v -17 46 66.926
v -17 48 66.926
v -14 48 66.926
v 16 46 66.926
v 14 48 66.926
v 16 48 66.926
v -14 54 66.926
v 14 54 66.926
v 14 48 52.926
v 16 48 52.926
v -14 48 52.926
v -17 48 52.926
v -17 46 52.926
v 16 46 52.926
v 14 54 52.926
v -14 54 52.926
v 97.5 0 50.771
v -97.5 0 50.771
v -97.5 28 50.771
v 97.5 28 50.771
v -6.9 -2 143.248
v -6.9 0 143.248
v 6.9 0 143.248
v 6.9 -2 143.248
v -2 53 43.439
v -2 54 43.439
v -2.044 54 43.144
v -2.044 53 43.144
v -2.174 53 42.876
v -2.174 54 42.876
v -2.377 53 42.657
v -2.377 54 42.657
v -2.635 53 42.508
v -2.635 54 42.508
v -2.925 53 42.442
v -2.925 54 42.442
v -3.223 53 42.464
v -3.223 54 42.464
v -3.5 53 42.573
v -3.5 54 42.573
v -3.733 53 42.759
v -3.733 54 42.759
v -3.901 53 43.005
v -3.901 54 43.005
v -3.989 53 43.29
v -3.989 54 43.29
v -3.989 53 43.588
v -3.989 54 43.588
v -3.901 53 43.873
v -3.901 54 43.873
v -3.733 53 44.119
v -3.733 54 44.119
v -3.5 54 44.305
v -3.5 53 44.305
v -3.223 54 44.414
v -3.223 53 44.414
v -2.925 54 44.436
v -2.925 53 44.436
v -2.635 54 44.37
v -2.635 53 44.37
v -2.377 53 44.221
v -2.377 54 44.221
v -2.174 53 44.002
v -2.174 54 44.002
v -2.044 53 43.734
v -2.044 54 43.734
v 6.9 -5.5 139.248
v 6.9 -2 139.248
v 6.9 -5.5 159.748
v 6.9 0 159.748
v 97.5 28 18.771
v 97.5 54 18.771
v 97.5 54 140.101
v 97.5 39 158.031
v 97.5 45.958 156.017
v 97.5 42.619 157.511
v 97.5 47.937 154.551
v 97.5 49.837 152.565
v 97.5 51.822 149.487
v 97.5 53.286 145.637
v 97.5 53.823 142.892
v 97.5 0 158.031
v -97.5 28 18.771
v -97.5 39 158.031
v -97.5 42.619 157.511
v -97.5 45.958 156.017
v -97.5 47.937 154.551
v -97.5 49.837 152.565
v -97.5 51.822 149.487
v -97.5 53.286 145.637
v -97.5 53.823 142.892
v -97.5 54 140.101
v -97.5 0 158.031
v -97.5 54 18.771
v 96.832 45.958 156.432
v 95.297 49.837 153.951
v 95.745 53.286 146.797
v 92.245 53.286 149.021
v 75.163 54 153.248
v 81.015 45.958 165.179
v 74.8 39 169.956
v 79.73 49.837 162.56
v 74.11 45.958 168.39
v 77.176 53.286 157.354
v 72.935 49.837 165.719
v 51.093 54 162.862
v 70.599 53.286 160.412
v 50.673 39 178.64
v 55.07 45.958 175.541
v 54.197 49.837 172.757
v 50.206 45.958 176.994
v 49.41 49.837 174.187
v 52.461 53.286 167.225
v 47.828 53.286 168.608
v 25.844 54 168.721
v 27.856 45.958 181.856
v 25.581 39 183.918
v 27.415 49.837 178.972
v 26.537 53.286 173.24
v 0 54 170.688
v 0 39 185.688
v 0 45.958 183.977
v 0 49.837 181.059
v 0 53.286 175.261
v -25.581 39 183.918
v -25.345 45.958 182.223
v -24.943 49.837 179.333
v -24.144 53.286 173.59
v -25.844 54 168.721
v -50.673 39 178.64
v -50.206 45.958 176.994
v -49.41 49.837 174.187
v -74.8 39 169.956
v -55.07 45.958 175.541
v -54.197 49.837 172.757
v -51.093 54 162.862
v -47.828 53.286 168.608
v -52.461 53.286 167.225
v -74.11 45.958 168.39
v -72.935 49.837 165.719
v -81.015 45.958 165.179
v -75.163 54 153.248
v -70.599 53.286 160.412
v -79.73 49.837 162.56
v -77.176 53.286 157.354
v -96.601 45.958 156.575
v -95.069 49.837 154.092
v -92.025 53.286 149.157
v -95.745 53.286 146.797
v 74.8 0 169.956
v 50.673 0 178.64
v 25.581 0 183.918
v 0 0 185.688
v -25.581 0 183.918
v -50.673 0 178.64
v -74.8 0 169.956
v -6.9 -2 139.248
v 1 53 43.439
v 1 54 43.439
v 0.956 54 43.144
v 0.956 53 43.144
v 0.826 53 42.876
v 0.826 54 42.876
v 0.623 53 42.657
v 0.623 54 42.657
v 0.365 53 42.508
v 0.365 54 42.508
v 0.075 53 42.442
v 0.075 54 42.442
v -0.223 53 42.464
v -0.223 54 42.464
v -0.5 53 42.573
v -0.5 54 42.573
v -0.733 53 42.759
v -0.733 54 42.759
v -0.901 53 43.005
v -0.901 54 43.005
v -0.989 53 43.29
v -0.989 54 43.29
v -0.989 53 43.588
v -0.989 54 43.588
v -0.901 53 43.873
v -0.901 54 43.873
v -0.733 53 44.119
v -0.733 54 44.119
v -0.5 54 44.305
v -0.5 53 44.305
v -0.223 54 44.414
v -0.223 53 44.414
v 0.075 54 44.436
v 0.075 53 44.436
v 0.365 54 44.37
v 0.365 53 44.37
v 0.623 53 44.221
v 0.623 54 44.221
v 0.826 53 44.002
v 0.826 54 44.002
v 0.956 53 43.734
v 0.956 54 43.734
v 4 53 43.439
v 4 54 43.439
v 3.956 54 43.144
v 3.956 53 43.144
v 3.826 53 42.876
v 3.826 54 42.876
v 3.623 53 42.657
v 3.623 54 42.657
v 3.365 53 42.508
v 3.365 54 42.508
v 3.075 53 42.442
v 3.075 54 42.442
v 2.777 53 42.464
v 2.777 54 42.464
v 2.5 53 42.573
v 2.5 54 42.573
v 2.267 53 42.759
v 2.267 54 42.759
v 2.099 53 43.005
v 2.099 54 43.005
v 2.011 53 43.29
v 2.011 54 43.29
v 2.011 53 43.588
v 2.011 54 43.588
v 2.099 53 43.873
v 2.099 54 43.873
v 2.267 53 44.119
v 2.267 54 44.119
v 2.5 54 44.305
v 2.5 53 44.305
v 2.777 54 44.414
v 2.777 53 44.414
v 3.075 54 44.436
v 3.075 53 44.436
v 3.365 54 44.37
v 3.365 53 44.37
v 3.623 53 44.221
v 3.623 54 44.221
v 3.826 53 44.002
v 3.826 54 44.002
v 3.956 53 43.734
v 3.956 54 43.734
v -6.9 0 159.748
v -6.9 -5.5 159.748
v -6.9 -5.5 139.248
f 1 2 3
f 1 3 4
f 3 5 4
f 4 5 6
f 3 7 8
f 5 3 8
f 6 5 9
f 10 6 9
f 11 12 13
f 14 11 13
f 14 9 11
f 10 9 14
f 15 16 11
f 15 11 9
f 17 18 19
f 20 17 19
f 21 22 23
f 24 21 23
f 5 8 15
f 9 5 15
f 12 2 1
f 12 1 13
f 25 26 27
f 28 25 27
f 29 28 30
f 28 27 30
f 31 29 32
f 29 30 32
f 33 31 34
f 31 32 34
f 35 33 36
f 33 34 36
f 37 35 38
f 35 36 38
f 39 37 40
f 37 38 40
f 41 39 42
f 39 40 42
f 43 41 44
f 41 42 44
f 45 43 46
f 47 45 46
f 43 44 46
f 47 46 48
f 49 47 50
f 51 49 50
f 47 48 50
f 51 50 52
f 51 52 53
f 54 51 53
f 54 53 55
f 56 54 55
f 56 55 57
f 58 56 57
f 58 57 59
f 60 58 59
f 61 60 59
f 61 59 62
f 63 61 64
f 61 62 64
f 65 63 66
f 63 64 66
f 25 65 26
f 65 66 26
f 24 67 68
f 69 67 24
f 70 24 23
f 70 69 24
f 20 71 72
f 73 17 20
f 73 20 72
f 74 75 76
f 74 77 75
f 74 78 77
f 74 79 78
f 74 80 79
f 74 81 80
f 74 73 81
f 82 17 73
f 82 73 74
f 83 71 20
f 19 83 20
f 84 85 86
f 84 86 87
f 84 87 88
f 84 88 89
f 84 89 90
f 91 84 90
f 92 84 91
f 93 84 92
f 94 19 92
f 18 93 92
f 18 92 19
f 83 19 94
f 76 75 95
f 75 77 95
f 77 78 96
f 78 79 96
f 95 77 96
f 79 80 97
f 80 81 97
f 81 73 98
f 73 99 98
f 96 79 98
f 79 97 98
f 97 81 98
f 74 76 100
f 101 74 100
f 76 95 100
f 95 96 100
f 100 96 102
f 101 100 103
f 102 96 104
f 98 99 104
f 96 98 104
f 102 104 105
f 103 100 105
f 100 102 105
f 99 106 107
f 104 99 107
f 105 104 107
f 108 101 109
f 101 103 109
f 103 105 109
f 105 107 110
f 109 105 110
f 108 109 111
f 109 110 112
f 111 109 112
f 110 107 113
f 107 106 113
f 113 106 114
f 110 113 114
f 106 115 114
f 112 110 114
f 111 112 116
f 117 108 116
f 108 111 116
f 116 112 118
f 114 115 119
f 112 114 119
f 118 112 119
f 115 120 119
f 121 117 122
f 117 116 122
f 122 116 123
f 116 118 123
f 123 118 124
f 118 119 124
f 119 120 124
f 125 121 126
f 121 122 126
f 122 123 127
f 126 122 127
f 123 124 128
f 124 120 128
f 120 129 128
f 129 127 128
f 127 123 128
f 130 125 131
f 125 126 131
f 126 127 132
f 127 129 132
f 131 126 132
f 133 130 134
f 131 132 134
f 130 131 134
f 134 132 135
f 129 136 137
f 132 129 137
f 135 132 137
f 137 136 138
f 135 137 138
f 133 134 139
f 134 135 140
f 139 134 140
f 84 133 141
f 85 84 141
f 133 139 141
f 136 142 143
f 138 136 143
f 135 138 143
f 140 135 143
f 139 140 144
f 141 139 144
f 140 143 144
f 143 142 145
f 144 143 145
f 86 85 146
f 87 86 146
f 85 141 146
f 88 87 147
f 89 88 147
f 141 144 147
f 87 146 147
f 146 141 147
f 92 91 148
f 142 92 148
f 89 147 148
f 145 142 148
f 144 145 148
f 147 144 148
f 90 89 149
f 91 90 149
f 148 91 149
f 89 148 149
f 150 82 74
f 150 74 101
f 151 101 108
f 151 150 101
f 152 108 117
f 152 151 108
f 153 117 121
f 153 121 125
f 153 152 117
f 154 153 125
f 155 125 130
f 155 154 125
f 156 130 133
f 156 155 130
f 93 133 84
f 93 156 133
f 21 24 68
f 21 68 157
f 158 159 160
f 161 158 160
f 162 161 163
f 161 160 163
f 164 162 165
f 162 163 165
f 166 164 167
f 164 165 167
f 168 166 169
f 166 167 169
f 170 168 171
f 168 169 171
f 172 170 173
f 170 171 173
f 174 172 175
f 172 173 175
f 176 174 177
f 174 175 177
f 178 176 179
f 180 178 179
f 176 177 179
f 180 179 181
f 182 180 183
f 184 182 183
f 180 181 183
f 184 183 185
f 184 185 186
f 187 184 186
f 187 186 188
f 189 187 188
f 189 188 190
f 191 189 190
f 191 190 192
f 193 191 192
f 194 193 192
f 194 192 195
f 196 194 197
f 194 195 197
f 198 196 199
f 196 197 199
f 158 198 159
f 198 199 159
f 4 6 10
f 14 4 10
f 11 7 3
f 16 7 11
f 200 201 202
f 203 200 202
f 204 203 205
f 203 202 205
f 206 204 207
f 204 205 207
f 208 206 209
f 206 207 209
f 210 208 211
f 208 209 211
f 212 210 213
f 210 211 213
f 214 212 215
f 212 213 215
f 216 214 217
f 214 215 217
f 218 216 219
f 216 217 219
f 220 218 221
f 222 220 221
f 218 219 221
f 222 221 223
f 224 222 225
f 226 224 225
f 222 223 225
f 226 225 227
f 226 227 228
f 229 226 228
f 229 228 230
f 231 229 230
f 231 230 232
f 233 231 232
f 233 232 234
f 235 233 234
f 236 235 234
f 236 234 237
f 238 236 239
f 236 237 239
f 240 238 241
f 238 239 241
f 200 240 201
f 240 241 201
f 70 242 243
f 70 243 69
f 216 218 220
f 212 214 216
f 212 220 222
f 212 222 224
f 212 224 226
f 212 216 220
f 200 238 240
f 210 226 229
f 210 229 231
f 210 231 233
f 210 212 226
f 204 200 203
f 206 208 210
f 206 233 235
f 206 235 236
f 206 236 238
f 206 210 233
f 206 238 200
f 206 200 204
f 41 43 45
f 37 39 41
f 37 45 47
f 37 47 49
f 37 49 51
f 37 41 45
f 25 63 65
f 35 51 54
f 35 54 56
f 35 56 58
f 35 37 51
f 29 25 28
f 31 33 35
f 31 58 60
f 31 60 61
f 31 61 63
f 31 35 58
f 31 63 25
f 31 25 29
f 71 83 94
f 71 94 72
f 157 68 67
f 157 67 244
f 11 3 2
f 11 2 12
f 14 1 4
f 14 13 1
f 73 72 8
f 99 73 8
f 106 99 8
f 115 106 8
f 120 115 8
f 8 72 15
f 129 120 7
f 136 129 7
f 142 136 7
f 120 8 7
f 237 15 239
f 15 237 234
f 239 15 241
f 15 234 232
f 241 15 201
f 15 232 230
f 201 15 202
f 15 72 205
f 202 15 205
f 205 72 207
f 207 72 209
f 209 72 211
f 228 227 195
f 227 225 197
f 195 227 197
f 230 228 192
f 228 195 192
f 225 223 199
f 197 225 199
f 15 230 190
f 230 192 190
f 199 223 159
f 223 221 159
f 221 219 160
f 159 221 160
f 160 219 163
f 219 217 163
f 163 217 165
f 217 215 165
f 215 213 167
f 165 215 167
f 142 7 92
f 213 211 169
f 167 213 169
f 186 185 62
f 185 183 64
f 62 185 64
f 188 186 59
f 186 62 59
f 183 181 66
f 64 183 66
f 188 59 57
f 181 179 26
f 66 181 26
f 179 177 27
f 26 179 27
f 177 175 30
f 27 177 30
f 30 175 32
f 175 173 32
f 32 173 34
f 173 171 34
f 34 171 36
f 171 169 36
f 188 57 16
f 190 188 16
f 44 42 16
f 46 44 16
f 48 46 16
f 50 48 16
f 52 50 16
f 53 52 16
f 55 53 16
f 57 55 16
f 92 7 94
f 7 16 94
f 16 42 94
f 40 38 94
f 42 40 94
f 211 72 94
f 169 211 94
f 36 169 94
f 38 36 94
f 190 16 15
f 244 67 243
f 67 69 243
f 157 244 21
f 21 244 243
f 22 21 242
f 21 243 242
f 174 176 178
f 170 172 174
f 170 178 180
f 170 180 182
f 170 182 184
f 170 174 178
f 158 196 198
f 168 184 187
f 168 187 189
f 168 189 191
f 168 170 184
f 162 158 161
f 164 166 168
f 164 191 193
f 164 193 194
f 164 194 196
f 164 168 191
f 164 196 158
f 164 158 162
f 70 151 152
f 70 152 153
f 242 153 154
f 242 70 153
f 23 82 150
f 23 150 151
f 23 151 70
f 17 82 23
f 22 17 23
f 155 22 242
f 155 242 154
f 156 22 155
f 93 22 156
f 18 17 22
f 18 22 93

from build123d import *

# Parameters (mm, degrees)
BOSS_EXTRUDE1_DEPTH     = 54
FILLET1_R               = 15
SKETCH2_W               = 32
SKETCH2_H               = 28
CUT_EXTRUDE1_DEPTH      = 445
SKETCH3_W               = 13.8
SKETCH3_H               = 16.5
BOSS_EXTRUDE2_DEPTH     = 5.5
SKETCH4_W               = 13.8
SKETCH4_H               = 3.5
BOSS_EXTRUDE3_DEPTH     = 4
SKETCH5_R               = 1
CUT_EXTRUDE2_DEPTH      = 1
SKETCH6_W               = 28
SKETCH6_H               = 14
CUT_EXTRUDE3_DEPTH      = 8
SKETCH7_W               = 14
SKETCH7_H               = 2
CUT_EXTRUDE4_DEPTH      = 30
CUT_EXTRUDE4_DEPTH_BACK = 3


with BuildPart() as part:
    # Sketch1 → Boss-Extrude1 (new body)
    with BuildSketch(Plane(origin=(0, 0, 0), x_dir=(1, 0, 0), z_dir=(0, 1, 0))):
        with BuildLine():
            Line((-97.5, -18.771444772), (97.5, -18.771444772))
            Line((97.5, -18.771444772), (97.5, -158.031444772))
            ThreePointArc((97.5, -158.031444772), (0, -185.688415193), (-97.5, -158.031444772))
            Line((-97.5, -158.031444772), (-97.5, -18.771444772))
        make_face()
    extrude(amount=BOSS_EXTRUDE1_DEPTH)

    # Fillet1
    fillet1_edges = [part.edges().sort_by_distance(p)[0] for p in [
        (0, 54, 185.688415193),
    ]]
    fillet(fillet1_edges, radius=FILLET1_R)

    # Sketch2 → Cut-Extrude1 (cut)
    with BuildSketch(Plane.ZY.offset(97.5)):
        with Locations((34.771444772, 14)):
            Rectangle(SKETCH2_W, SKETCH2_H)
    extrude(amount=-CUT_EXTRUDE1_DEPTH, mode=Mode.SUBTRACT)

    # Sketch3 → Boss-Extrude2 (add)
    with BuildSketch(Plane.XZ):
        with Locations((0, 151.498415193)):
            Rectangle(SKETCH3_W, SKETCH3_H)
    extrude(amount=BOSS_EXTRUDE2_DEPTH)

    # Sketch4 → Boss-Extrude3 (add)
    with BuildSketch(Plane(origin=(0, 0, 143.248415193), x_dir=(-1, 0, 0), z_dir=(0, 0, -1))):
        with Locations((0, -3.75)):
            Rectangle(SKETCH4_W, SKETCH4_H)
    extrude(amount=BOSS_EXTRUDE3_DEPTH)

    # Sketch5 → Cut-Extrude2 (cut)
    with BuildSketch(Plane(origin=(0, 54, 0), x_dir=(1, 0, 0), z_dir=(0, 1, 0))):
        with Locations((0, -43.438827689)):
            Circle(SKETCH5_R)
        with Locations((3, -43.438827689)):
            Circle(SKETCH5_R)
        with Locations((-3, -43.438827689)):
            Circle(SKETCH5_R)
    extrude(amount=-CUT_EXTRUDE2_DEPTH, mode=Mode.SUBTRACT)

    # Sketch6 → Cut-Extrude3 (cut)
    with BuildSketch(Plane(origin=(0, 54, 0), x_dir=(1, 0, 0), z_dir=(0, 1, 0))):
        with Locations((0, -59.925549651)):
            Rectangle(SKETCH6_W, SKETCH6_H)
    extrude(amount=-CUT_EXTRUDE3_DEPTH, mode=Mode.SUBTRACT)

    # Sketch7 → Cut-Extrude4 (cut, two sides)
    with BuildSketch(Plane(origin=(-14, 0, 0), x_dir=(0, 0, -1), z_dir=(1, 0, 0))) as cut_extrude4_sk:
        with Locations((-59.925549651, 47)):
            Rectangle(SKETCH7_W, SKETCH7_H)
    extrude(amount=CUT_EXTRUDE4_DEPTH, mode=Mode.SUBTRACT)
    extrude(cut_extrude4_sk.sketch, amount=-CUT_EXTRUDE4_DEPTH_BACK, mode=Mode.SUBTRACT)


solid = part.part
